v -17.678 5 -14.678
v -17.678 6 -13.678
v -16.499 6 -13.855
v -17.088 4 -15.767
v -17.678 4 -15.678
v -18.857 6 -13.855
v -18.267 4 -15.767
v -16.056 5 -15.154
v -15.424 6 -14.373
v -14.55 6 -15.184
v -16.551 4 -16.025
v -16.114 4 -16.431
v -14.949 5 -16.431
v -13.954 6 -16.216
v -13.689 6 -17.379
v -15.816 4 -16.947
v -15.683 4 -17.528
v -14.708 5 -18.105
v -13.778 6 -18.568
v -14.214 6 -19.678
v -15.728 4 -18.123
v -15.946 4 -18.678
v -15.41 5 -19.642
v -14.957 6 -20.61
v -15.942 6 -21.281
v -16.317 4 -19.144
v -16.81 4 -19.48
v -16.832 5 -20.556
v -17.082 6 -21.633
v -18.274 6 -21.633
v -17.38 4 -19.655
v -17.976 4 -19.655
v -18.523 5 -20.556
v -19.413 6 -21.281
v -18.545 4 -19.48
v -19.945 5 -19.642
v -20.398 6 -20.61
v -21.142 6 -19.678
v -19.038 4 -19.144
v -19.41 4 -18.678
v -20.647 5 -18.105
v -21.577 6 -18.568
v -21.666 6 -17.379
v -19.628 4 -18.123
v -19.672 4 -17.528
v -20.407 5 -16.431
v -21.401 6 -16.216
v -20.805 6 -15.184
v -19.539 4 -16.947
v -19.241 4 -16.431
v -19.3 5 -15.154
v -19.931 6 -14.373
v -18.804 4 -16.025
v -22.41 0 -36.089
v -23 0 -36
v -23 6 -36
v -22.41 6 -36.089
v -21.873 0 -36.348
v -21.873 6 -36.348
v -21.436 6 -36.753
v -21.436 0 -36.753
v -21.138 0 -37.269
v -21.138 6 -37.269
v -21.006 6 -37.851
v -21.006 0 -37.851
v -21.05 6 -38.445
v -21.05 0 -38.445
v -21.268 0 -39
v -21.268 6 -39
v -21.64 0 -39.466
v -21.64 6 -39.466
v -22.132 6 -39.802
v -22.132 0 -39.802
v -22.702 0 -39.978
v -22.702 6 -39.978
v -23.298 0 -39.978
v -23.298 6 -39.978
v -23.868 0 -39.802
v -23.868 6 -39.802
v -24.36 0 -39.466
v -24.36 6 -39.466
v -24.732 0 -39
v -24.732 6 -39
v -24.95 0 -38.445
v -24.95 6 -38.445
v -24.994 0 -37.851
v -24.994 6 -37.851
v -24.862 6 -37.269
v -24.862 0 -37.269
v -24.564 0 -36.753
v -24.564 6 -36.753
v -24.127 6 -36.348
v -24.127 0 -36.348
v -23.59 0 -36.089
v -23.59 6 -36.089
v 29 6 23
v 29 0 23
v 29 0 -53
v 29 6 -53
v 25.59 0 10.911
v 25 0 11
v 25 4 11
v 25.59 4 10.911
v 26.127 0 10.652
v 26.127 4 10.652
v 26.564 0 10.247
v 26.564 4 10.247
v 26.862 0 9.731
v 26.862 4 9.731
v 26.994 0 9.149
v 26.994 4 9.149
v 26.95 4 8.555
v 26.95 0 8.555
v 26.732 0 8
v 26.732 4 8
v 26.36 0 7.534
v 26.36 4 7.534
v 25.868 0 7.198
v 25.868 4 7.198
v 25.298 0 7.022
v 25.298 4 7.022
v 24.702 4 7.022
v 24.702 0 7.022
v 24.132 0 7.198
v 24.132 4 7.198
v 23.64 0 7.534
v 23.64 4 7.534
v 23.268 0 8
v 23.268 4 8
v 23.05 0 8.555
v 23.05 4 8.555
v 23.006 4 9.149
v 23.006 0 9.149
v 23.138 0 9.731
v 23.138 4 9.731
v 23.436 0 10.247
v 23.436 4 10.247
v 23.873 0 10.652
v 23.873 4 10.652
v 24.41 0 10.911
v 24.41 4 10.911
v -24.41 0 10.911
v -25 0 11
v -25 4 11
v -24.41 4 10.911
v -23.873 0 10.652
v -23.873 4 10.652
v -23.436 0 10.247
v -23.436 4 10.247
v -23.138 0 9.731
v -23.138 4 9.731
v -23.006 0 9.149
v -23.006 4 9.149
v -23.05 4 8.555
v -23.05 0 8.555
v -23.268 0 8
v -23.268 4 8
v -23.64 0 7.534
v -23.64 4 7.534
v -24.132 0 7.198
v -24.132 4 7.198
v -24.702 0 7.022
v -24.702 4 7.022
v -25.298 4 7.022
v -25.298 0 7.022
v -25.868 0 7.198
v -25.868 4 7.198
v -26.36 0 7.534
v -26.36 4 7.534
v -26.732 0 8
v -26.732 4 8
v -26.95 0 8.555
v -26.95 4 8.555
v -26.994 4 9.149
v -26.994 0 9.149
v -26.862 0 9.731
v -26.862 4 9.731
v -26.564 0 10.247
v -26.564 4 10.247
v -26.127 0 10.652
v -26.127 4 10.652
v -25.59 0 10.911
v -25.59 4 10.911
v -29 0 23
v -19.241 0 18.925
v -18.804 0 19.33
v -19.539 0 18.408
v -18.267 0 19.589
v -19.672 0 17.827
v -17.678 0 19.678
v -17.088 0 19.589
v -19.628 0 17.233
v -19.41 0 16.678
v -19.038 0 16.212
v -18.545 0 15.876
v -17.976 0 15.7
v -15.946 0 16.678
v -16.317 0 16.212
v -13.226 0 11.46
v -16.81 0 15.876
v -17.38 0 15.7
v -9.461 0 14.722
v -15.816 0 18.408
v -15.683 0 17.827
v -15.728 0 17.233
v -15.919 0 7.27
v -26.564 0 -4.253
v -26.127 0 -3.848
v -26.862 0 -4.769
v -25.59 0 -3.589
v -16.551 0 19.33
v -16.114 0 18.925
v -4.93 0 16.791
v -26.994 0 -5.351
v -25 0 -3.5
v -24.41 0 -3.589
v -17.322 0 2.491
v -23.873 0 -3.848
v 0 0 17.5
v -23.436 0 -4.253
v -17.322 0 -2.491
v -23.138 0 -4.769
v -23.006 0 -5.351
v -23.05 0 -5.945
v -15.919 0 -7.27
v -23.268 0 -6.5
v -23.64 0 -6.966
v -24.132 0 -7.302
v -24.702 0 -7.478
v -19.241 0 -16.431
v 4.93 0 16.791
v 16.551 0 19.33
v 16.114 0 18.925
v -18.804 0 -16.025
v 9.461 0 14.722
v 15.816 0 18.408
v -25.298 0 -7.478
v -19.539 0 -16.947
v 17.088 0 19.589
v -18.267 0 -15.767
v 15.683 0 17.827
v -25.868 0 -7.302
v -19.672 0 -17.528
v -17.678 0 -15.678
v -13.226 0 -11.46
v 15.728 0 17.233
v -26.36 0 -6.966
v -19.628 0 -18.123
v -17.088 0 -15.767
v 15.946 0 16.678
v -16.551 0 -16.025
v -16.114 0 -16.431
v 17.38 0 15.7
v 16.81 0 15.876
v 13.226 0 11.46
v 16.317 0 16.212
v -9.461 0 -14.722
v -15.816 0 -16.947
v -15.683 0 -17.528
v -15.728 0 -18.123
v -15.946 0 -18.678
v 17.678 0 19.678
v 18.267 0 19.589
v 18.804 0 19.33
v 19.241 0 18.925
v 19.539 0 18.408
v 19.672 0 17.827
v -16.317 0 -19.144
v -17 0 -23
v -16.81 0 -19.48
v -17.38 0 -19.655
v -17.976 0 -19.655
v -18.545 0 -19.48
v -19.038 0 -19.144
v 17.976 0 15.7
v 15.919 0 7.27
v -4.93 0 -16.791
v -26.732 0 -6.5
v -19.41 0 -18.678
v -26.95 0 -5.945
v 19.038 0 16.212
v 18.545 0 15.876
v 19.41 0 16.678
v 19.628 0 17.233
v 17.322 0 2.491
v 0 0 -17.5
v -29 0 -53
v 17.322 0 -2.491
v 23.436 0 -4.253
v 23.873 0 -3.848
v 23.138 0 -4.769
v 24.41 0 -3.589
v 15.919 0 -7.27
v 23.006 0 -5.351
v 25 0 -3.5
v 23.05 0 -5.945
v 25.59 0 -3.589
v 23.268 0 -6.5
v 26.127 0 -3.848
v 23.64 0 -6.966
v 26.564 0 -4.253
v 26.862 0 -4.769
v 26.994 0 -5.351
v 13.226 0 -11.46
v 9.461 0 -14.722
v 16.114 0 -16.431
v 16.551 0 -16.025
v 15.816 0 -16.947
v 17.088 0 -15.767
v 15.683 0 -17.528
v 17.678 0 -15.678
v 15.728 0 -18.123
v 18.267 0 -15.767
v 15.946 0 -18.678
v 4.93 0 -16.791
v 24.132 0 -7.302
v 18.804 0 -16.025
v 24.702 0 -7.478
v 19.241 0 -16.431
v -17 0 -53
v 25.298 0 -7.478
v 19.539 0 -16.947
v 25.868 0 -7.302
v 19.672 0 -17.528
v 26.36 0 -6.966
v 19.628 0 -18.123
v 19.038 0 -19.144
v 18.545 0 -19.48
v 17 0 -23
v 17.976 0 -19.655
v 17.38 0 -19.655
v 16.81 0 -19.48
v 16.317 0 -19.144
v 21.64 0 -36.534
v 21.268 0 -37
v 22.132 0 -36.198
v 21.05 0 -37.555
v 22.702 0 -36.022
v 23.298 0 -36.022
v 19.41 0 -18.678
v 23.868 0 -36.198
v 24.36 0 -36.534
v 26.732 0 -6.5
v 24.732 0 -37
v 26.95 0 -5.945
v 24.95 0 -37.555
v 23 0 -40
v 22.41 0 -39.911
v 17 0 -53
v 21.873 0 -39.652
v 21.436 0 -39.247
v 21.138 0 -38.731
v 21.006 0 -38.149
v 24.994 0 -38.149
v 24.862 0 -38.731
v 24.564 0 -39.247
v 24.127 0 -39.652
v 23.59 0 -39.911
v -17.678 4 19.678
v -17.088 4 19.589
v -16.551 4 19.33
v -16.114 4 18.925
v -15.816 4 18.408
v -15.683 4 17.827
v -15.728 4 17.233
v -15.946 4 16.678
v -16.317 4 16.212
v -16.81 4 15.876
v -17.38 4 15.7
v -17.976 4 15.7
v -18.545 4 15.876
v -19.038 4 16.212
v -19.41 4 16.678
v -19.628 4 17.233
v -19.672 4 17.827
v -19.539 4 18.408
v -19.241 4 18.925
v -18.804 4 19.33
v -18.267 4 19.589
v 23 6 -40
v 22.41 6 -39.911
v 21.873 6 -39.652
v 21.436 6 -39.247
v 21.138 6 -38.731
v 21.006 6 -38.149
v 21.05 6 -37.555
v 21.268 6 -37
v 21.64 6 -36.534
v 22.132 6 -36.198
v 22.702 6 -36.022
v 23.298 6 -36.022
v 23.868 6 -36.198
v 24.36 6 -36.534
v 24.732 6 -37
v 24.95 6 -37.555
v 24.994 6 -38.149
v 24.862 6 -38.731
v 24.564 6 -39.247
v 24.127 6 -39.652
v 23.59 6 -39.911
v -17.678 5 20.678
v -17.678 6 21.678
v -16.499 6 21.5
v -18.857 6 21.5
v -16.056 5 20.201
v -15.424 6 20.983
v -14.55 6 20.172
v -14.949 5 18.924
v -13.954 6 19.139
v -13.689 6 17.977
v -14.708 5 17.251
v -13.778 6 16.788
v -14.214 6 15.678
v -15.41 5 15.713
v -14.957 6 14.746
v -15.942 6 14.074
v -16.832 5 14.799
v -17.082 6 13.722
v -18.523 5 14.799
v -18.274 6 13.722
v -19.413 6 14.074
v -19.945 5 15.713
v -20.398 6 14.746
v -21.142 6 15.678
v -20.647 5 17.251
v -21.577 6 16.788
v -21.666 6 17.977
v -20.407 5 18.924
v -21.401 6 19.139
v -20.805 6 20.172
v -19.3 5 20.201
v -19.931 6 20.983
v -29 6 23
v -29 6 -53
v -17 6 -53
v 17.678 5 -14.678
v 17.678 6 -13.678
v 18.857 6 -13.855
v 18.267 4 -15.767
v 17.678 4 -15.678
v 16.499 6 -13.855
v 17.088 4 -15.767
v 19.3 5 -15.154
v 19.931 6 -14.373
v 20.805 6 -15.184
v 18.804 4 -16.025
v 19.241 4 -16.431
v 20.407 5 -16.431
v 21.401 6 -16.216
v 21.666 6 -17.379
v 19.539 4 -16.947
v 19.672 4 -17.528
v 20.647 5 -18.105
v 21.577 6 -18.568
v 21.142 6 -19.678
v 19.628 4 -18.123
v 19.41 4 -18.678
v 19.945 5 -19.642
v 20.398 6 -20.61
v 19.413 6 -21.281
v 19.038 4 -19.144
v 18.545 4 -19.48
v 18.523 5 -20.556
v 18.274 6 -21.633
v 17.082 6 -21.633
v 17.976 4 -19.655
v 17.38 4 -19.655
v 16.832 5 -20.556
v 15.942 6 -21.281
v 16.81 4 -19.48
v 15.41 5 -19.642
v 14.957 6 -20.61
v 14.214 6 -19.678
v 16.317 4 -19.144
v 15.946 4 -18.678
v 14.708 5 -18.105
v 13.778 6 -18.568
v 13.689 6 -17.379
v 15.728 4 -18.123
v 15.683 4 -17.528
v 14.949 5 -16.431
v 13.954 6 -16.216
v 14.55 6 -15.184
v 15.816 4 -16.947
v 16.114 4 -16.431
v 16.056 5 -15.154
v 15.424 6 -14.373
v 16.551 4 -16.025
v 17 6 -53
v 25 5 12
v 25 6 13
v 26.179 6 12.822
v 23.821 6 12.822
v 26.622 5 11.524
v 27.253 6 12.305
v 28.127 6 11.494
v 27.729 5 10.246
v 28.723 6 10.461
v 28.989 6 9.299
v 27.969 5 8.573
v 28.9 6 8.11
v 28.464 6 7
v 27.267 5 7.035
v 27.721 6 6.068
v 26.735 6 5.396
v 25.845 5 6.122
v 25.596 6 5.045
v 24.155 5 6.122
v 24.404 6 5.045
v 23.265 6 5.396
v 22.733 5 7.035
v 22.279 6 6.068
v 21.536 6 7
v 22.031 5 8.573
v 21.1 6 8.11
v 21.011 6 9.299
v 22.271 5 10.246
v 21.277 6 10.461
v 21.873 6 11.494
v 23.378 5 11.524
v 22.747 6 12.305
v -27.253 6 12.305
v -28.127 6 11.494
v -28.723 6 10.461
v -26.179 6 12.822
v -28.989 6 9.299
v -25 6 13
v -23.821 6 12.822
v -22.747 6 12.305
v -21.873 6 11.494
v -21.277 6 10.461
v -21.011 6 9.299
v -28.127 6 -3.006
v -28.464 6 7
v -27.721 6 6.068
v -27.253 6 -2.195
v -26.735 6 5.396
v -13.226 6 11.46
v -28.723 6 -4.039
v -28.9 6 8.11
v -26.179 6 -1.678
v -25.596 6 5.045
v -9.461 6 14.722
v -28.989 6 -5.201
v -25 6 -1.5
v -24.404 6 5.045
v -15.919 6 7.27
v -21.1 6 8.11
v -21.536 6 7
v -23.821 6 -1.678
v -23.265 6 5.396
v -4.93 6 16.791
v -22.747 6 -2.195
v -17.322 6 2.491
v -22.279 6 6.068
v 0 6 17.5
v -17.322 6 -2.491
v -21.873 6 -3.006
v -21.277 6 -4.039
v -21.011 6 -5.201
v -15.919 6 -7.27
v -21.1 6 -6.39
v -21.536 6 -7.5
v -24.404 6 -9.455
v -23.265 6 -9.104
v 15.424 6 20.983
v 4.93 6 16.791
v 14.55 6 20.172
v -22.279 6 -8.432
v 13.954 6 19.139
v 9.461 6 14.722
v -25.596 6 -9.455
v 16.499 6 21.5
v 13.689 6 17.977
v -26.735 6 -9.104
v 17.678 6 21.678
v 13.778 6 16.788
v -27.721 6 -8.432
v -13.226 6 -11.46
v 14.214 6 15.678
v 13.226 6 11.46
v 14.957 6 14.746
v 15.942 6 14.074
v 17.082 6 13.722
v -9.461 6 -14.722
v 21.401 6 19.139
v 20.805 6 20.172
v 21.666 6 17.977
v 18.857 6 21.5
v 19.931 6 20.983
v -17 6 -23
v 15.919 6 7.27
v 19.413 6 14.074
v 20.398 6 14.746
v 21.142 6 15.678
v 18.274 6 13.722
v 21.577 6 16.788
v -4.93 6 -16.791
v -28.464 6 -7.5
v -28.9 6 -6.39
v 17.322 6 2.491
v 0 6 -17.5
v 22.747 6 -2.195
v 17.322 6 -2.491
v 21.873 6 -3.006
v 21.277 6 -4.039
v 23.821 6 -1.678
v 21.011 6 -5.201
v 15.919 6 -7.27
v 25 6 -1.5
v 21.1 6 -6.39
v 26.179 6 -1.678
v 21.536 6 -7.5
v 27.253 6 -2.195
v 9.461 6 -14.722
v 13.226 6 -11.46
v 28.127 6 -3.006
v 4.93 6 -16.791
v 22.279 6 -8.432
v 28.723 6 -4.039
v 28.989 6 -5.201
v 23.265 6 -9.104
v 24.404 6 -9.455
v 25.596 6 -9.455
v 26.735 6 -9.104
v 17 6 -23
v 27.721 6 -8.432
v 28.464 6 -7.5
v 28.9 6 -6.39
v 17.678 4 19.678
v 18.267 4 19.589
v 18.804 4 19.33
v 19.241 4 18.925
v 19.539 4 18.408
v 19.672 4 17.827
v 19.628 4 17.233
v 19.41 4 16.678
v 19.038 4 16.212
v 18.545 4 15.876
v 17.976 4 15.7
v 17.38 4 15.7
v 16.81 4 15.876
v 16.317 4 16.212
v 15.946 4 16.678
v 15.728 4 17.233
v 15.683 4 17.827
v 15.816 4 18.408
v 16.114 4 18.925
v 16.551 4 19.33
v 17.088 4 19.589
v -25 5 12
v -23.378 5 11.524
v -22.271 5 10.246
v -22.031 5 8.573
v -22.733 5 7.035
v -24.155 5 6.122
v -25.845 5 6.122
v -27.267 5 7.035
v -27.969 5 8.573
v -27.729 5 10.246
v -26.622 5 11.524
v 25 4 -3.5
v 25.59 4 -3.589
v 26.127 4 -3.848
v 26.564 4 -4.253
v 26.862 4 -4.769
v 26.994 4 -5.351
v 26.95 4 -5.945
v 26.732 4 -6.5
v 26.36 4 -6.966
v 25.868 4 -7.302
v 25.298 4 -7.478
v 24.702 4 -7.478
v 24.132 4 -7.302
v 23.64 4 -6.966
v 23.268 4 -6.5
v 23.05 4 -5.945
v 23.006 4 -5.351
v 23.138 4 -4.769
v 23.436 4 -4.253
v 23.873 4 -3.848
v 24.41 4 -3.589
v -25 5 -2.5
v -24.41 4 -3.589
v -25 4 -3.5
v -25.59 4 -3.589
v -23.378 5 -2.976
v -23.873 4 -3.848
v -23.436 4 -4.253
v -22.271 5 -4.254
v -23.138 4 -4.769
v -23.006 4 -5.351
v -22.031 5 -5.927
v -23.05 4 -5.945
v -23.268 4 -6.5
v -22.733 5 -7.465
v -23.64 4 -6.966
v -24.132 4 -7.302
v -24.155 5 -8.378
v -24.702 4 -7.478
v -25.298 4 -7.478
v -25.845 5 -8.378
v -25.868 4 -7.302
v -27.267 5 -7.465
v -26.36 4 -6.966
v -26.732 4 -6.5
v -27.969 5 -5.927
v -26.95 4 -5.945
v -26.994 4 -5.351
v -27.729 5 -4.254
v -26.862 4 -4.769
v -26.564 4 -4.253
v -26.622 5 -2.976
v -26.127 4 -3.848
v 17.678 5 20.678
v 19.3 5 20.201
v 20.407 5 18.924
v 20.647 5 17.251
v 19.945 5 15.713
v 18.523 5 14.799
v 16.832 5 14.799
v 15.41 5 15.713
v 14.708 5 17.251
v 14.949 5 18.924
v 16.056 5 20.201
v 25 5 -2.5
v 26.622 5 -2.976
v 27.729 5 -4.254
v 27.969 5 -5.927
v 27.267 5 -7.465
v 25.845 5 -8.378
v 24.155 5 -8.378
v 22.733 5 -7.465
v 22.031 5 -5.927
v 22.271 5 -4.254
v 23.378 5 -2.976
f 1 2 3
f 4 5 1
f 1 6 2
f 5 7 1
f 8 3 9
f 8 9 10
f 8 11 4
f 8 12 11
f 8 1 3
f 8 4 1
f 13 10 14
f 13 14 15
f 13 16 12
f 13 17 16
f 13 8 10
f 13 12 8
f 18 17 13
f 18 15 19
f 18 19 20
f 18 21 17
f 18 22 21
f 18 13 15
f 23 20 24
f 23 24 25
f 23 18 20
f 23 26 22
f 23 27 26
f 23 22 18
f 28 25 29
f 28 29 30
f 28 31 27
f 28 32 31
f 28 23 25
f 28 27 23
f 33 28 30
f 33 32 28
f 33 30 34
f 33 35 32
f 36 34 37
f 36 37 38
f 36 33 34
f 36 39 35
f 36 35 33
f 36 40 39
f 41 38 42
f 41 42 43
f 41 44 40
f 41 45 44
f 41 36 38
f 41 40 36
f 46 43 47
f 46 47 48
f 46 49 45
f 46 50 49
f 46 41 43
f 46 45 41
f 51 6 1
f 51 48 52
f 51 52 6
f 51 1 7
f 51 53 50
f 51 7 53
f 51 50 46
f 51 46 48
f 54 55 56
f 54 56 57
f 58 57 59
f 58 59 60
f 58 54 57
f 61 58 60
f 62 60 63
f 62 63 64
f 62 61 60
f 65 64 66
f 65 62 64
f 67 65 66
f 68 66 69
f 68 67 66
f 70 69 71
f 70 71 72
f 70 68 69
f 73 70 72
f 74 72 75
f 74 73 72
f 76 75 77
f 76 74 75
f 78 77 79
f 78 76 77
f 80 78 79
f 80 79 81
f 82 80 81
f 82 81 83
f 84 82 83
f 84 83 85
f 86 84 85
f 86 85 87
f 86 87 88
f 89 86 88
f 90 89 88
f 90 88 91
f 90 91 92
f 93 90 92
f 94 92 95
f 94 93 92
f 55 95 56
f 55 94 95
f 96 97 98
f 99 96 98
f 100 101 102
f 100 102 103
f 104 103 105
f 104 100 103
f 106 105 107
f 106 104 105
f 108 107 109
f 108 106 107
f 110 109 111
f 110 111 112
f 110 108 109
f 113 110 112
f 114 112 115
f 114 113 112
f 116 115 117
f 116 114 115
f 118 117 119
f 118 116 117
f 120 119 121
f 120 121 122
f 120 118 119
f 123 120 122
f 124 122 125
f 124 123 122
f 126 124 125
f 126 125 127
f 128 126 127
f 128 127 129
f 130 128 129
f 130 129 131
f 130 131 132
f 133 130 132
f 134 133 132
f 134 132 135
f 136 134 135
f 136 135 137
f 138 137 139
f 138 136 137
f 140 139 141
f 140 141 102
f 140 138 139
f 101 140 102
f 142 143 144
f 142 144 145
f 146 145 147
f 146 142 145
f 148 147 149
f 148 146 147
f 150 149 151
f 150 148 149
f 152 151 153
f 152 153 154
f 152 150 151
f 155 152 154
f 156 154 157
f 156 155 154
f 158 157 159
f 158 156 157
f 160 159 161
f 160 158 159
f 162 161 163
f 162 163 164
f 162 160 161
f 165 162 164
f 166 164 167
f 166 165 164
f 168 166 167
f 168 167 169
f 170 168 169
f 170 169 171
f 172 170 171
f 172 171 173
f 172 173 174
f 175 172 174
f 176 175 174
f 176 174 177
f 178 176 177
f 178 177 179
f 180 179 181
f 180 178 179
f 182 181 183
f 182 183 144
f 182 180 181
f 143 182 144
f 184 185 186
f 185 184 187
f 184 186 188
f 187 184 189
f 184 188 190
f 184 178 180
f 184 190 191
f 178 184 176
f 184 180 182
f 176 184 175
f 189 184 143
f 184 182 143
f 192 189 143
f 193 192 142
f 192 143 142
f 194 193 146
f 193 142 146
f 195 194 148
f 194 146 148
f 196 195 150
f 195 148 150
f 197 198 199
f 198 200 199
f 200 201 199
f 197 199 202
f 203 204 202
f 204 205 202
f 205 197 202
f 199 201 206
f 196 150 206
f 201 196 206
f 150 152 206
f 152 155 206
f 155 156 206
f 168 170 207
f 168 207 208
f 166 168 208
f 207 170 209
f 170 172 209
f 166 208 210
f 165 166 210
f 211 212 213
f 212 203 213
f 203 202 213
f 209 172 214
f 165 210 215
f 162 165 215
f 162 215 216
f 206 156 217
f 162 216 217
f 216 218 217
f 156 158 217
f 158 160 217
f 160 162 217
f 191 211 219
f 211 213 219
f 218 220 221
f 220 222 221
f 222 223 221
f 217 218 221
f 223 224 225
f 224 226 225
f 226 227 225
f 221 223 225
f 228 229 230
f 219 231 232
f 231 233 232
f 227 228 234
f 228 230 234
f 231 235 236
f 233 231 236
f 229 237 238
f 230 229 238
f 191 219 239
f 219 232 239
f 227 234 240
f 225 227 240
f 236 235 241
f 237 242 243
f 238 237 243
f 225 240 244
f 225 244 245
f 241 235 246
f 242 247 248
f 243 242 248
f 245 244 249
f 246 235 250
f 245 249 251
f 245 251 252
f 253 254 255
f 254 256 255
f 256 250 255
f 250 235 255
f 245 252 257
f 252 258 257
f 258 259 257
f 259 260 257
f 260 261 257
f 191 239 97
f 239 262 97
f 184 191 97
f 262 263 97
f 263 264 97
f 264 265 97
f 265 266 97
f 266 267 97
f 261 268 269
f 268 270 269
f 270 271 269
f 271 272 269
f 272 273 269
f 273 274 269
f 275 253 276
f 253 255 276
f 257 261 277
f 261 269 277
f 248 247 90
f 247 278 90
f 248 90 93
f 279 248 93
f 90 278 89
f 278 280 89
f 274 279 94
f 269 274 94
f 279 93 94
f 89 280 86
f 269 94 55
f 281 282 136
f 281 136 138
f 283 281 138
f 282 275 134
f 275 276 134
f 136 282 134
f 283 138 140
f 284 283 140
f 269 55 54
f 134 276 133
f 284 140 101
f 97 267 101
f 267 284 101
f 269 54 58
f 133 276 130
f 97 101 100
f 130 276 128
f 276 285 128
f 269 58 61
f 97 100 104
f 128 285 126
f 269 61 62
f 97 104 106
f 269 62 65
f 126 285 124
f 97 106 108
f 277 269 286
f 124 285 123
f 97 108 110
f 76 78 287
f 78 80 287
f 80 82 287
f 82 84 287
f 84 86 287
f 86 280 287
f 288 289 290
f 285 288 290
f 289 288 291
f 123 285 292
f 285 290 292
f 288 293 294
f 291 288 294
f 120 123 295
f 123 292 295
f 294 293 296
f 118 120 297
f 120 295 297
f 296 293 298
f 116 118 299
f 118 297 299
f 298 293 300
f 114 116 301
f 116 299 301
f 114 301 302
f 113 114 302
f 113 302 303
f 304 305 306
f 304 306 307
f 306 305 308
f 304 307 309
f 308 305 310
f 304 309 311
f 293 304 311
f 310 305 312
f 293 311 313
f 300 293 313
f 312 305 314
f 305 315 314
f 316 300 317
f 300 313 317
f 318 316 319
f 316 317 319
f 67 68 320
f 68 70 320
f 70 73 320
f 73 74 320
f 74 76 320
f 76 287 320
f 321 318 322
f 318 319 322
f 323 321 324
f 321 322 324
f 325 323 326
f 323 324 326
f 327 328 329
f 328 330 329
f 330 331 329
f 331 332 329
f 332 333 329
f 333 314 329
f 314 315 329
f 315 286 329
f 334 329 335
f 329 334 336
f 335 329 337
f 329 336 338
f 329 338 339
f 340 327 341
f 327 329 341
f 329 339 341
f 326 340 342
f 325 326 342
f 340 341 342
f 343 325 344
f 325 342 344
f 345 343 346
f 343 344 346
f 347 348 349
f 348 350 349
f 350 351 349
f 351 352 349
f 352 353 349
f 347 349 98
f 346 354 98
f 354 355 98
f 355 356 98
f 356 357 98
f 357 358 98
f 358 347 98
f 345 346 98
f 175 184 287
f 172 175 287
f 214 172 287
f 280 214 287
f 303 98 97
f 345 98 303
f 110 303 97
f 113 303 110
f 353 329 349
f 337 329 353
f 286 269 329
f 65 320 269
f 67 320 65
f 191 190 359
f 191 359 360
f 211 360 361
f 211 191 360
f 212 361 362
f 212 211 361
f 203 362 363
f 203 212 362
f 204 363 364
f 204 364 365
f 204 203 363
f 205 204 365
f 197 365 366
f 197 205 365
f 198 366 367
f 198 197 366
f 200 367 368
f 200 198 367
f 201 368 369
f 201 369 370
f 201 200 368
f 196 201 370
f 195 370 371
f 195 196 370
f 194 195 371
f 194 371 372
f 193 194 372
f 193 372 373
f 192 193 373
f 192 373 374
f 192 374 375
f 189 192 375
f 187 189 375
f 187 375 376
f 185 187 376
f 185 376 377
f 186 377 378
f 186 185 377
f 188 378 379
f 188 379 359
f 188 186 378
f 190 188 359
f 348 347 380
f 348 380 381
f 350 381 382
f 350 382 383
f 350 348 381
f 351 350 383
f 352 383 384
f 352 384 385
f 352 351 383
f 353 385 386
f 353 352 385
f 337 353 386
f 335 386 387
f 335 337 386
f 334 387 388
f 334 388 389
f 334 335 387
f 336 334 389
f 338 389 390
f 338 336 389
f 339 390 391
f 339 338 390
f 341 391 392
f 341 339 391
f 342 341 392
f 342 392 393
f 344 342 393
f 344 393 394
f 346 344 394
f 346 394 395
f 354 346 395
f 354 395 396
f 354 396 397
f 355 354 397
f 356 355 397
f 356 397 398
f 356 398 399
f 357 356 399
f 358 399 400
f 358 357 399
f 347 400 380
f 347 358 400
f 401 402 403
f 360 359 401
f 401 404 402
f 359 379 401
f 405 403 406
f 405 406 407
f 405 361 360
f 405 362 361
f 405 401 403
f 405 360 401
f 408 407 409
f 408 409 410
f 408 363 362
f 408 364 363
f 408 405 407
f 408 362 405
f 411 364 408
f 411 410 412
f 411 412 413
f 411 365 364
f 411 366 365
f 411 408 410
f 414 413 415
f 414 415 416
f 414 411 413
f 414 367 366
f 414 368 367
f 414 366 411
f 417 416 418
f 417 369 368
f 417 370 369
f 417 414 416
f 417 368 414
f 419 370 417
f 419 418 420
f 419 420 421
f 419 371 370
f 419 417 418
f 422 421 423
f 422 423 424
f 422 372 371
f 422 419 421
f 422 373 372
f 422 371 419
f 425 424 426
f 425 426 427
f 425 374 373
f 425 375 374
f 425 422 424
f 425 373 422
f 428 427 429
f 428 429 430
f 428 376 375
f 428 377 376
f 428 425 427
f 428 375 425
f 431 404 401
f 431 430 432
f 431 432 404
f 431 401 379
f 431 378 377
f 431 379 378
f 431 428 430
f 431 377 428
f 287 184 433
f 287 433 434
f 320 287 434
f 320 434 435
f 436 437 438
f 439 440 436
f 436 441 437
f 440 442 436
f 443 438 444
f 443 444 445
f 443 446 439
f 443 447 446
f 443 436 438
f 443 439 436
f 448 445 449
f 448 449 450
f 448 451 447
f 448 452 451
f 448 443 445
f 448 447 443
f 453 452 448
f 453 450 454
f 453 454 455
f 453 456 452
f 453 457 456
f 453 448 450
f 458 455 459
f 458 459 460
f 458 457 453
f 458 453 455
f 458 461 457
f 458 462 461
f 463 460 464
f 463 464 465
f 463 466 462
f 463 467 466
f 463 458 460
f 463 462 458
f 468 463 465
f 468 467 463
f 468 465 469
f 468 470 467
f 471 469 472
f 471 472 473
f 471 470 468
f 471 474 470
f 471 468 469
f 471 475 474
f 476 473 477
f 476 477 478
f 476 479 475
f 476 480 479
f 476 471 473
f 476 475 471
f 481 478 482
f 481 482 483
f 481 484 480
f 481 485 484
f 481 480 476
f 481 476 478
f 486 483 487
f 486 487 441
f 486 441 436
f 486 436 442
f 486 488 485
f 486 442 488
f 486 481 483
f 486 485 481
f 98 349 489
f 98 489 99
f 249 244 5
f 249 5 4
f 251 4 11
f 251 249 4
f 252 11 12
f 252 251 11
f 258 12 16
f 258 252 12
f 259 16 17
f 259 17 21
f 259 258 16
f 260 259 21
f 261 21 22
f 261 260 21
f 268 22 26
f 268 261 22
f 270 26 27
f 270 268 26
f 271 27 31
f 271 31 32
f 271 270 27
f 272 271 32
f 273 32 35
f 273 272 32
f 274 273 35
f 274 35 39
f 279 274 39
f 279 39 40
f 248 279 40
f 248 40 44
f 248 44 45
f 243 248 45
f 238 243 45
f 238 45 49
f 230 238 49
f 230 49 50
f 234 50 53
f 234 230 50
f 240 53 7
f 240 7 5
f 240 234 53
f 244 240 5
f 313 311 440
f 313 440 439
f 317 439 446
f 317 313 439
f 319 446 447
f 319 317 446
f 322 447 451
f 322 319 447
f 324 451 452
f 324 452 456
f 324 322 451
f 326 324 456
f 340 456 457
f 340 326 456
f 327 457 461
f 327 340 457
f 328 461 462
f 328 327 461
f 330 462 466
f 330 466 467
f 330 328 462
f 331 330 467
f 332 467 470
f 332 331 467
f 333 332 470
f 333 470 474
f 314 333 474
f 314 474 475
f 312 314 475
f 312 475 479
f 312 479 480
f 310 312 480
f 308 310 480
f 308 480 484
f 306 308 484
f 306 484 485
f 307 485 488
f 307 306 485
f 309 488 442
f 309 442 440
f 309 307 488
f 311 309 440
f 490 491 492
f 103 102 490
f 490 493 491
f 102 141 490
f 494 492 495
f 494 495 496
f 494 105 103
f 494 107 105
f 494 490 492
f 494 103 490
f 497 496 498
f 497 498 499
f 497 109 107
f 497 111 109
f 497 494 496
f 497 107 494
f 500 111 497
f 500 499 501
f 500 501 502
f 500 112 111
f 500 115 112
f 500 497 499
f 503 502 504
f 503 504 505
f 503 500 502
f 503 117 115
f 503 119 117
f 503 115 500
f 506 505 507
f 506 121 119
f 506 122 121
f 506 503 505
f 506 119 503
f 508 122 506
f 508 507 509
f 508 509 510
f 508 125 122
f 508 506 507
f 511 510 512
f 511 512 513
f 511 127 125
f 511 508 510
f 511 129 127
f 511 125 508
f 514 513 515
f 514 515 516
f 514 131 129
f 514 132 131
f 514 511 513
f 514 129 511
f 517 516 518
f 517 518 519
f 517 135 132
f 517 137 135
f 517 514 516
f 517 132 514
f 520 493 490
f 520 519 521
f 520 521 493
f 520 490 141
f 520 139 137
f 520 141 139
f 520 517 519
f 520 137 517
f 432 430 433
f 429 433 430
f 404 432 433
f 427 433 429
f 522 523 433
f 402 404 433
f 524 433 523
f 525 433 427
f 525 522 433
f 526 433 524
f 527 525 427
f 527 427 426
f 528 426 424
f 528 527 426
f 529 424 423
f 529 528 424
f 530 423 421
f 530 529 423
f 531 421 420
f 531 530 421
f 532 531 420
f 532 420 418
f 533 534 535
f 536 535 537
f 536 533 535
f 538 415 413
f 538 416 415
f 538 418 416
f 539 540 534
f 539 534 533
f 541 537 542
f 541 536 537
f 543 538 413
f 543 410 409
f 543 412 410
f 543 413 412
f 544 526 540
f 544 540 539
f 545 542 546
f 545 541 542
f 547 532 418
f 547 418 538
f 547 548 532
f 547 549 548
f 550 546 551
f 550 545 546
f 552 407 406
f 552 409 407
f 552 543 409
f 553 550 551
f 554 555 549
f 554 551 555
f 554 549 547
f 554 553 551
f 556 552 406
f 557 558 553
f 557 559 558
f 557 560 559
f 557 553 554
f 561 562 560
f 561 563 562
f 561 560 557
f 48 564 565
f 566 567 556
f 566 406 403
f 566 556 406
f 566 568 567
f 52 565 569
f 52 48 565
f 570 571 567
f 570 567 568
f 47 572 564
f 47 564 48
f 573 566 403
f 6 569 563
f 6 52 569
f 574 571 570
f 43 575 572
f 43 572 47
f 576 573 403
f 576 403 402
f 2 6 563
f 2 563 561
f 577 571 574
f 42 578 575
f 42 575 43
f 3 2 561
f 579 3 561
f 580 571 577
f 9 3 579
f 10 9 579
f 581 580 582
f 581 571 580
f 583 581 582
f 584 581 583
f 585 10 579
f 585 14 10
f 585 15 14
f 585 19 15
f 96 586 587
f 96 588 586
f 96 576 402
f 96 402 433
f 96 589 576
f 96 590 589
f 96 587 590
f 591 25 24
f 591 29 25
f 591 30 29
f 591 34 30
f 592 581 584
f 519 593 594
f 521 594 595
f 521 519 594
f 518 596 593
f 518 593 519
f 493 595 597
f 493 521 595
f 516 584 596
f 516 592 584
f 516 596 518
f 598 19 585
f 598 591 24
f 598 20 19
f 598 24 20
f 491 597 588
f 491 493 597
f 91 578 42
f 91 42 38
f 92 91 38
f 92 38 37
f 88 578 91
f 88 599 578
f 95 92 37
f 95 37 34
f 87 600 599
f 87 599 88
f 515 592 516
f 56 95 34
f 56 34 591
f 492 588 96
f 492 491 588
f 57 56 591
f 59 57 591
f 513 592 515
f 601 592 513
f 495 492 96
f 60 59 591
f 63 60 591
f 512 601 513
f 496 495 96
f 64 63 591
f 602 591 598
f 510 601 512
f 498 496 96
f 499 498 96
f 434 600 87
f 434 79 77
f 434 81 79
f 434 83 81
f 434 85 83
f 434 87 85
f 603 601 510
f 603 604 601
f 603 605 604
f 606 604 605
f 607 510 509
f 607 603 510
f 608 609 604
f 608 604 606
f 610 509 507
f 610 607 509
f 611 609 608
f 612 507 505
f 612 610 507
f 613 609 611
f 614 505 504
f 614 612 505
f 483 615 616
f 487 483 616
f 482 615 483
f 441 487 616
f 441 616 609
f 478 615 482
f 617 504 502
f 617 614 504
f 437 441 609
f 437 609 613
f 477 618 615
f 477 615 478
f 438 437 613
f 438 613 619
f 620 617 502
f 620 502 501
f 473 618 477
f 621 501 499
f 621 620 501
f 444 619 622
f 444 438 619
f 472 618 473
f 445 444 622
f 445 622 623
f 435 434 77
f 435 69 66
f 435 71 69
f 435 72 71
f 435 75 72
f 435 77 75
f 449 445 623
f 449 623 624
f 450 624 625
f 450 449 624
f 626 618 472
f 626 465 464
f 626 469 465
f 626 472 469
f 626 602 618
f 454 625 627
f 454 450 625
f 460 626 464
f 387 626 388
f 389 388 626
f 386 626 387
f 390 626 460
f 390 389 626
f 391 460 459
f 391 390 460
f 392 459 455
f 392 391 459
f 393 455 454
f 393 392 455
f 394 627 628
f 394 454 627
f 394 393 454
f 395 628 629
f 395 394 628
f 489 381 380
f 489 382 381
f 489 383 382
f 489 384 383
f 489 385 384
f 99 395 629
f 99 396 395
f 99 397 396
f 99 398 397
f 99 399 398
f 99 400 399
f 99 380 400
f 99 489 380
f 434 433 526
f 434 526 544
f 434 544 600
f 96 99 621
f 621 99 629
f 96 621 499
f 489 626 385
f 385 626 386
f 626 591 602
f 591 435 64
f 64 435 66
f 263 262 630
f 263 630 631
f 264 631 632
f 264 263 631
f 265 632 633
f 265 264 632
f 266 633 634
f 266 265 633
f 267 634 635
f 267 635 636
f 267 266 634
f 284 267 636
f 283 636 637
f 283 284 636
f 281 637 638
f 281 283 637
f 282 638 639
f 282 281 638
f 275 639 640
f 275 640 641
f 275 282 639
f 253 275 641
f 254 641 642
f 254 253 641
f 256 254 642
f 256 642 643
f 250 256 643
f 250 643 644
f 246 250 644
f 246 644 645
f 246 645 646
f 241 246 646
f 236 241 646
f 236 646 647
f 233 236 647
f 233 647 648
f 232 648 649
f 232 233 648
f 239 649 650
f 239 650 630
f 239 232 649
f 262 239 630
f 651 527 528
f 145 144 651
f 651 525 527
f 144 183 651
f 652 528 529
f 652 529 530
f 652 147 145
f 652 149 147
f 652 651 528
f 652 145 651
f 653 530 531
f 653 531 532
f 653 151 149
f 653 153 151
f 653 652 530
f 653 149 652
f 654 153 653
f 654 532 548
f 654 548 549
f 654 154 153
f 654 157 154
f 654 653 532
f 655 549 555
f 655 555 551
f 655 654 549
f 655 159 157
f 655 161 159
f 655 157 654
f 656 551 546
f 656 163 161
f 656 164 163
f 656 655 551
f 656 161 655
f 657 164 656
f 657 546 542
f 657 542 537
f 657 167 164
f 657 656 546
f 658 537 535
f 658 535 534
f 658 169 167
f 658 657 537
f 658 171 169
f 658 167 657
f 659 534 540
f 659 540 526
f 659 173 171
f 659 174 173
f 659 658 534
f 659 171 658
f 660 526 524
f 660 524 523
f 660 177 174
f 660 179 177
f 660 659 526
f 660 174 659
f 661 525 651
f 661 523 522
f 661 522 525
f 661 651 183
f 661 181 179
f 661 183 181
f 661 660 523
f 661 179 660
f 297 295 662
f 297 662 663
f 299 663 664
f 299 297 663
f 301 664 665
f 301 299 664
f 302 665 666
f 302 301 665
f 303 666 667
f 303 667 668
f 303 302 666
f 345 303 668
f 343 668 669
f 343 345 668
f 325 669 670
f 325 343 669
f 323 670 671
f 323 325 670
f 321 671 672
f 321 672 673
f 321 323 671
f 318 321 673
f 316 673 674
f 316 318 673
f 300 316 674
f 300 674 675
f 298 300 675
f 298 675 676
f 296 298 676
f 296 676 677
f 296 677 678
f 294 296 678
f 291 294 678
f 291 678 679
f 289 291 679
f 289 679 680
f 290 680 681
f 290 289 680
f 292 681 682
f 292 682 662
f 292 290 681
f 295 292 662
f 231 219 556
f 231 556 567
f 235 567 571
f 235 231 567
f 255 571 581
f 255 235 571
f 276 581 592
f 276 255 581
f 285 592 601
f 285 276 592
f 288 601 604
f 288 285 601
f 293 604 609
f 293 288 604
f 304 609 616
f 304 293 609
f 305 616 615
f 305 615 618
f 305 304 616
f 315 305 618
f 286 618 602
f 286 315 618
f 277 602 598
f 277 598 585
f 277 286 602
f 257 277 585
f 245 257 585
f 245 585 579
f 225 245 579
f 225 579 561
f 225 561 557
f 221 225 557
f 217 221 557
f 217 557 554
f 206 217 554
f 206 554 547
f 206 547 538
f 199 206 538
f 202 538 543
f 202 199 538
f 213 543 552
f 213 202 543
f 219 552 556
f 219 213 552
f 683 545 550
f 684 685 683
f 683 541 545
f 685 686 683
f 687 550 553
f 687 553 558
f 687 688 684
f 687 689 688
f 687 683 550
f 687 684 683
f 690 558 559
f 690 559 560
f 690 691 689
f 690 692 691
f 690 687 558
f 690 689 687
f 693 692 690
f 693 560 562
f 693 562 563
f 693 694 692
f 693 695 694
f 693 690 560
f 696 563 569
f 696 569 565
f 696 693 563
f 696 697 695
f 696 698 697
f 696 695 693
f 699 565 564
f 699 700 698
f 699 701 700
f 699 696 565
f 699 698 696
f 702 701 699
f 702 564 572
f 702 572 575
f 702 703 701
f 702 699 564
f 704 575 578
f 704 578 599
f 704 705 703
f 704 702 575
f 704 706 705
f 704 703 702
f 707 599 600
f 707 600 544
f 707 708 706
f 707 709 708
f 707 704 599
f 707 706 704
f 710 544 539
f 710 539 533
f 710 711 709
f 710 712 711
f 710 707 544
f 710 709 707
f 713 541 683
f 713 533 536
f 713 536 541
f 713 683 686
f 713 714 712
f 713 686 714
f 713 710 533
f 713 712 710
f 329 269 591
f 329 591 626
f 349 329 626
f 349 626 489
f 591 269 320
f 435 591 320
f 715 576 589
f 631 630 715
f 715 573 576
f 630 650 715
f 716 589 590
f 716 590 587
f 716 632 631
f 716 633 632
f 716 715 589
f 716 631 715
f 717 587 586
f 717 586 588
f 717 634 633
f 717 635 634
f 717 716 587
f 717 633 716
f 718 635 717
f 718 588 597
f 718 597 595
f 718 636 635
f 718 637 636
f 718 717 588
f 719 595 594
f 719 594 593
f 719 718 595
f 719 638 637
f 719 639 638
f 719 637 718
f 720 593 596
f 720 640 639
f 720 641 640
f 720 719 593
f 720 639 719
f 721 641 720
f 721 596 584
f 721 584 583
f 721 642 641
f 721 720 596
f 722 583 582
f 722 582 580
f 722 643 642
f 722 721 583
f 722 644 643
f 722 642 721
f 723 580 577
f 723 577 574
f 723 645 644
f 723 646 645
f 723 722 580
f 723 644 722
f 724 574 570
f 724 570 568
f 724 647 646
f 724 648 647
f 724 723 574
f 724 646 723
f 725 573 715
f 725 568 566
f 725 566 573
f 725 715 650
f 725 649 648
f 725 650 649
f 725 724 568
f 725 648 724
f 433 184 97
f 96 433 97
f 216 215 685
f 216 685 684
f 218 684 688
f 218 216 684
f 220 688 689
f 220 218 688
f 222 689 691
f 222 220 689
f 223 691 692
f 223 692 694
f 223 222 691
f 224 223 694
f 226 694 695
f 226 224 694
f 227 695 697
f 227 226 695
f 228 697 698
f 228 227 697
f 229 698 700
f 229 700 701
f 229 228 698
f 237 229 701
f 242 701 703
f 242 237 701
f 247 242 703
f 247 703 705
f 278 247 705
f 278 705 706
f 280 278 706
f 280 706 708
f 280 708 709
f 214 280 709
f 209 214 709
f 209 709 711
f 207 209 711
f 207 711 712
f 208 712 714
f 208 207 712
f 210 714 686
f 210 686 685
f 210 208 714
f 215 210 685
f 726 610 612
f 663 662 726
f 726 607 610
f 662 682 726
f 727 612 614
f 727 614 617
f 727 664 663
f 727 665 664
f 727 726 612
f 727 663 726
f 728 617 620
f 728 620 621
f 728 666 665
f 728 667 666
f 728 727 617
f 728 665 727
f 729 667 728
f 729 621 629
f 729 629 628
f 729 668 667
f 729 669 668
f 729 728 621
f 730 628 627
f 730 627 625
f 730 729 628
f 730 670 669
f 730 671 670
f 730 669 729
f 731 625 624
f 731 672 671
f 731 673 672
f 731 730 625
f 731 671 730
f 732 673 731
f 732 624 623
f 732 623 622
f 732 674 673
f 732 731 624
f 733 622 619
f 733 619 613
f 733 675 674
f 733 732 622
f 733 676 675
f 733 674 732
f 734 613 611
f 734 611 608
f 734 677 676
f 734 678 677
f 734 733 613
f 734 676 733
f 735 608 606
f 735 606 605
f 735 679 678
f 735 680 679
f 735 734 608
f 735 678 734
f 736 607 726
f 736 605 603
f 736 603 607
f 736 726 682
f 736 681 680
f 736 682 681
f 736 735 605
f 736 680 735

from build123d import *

# Parameters (mm, degrees)
SKETCH_1_W      = 58
SKETCH_1_H      = 46
SKETCH_1_R      = 17.5
SKETCH_1_R_2    = 2
EXTRUDE_1_DEPTH = 6
SKETCH_2_W      = 12
SKETCH_2_H      = 30
SKETCH_2_R      = 2
EXTRUDE_2_DEPTH = 6
CHAMFER_1_SIZE  = 2


with BuildPart() as part:
    # 草图1 → 凸台-拉伸1 (new body)
    with BuildSketch(Plane(origin=(0, 0, 0), x_dir=(1, 0, 0), z_dir=(0, 1, 0))):
        Rectangle(SKETCH_1_W, SKETCH_1_H)
        with Locations(Location((0, 0, 0), (0, 0, 270))):
            Circle(SKETCH_1_R, mode=Mode.SUBTRACT)
        with Locations(Location((-17.67766953, 17.67766953, 0), (0, 0, 270))):
            Circle(SKETCH_1_R_2, mode=Mode.SUBTRACT)
        with Locations(Location((-17.67766953, -17.67766953, 0), (0, 0, 270))):
            Circle(SKETCH_1_R_2, mode=Mode.SUBTRACT)
        with Locations(Location((17.67766953, 17.67766953, 0), (0, 0, 270))):
            Circle(SKETCH_1_R_2, mode=Mode.SUBTRACT)
        with Locations(Location((17.67766953, -17.67766953, 0), (0, 0, 270))):
            Circle(SKETCH_1_R_2, mode=Mode.SUBTRACT)
        with Locations(Location((-25, 5.5, 0), (0, 0, 270))):
            Circle(SKETCH_1_R_2, mode=Mode.SUBTRACT)
        with Locations(Location((-25, -9, 0), (0, 0, 270))):
            Circle(SKETCH_1_R_2, mode=Mode.SUBTRACT)
        with Locations(Location((25, -9, 0), (0, 0, 270))):
            Circle(SKETCH_1_R_2, mode=Mode.SUBTRACT)
        with Locations(Location((25, 5.5, 0), (0, 0, 270))):
            Circle(SKETCH_1_R_2, mode=Mode.SUBTRACT)
    extrude(amount=EXTRUDE_1_DEPTH)

    # 草图2 → 凸台-拉伸2 (add)
    # profile 1 of 2: a face of its own
    with BuildSketch(Plane(origin=(0, 0, 0), x_dir=(1, 0, 0), z_dir=(0, 1, 0))):
        with Locations((-23, 38)):
            Rectangle(SKETCH_2_W, SKETCH_2_H)
        with Locations(Location((-23, 38, 0), (0, 0, 270))):
            Circle(SKETCH_2_R, mode=Mode.SUBTRACT)
    # profile 2 of 2: a face of its own
    with BuildSketch(Plane(origin=(0, 0, 0), x_dir=(1, 0, 0), z_dir=(0, 1, 0))):
        with Locations((23, 38)):
            Rectangle(SKETCH_2_W, SKETCH_2_H)
        with Locations(Location((23, 38, 0), (0, 0, 90))):
            Circle(SKETCH_2_R, mode=Mode.SUBTRACT)
    extrude(amount=EXTRUDE_2_DEPTH)

    # 倒角1
    chamfer_1_edges = [part.edges().sort_by_distance(p)[0] for p in [
        (25, 6, 7),
        (-25, 6, 7),
        (-25, 6, -7.5),
        (17.67766953, 6, -19.67766953),
        (-17.67766953, 6, 15.67766953),
        (-17.67766953, 6, -19.67766953),
        (17.67766953, 6, 15.67766953),
        (25, 6, -7.5),
    ]]
    chamfer(chamfer_1_edges, length=CHAMFER_1_SIZE - 0.0001)  # a hair under: the kernel refuses the full size


solid = part.part
